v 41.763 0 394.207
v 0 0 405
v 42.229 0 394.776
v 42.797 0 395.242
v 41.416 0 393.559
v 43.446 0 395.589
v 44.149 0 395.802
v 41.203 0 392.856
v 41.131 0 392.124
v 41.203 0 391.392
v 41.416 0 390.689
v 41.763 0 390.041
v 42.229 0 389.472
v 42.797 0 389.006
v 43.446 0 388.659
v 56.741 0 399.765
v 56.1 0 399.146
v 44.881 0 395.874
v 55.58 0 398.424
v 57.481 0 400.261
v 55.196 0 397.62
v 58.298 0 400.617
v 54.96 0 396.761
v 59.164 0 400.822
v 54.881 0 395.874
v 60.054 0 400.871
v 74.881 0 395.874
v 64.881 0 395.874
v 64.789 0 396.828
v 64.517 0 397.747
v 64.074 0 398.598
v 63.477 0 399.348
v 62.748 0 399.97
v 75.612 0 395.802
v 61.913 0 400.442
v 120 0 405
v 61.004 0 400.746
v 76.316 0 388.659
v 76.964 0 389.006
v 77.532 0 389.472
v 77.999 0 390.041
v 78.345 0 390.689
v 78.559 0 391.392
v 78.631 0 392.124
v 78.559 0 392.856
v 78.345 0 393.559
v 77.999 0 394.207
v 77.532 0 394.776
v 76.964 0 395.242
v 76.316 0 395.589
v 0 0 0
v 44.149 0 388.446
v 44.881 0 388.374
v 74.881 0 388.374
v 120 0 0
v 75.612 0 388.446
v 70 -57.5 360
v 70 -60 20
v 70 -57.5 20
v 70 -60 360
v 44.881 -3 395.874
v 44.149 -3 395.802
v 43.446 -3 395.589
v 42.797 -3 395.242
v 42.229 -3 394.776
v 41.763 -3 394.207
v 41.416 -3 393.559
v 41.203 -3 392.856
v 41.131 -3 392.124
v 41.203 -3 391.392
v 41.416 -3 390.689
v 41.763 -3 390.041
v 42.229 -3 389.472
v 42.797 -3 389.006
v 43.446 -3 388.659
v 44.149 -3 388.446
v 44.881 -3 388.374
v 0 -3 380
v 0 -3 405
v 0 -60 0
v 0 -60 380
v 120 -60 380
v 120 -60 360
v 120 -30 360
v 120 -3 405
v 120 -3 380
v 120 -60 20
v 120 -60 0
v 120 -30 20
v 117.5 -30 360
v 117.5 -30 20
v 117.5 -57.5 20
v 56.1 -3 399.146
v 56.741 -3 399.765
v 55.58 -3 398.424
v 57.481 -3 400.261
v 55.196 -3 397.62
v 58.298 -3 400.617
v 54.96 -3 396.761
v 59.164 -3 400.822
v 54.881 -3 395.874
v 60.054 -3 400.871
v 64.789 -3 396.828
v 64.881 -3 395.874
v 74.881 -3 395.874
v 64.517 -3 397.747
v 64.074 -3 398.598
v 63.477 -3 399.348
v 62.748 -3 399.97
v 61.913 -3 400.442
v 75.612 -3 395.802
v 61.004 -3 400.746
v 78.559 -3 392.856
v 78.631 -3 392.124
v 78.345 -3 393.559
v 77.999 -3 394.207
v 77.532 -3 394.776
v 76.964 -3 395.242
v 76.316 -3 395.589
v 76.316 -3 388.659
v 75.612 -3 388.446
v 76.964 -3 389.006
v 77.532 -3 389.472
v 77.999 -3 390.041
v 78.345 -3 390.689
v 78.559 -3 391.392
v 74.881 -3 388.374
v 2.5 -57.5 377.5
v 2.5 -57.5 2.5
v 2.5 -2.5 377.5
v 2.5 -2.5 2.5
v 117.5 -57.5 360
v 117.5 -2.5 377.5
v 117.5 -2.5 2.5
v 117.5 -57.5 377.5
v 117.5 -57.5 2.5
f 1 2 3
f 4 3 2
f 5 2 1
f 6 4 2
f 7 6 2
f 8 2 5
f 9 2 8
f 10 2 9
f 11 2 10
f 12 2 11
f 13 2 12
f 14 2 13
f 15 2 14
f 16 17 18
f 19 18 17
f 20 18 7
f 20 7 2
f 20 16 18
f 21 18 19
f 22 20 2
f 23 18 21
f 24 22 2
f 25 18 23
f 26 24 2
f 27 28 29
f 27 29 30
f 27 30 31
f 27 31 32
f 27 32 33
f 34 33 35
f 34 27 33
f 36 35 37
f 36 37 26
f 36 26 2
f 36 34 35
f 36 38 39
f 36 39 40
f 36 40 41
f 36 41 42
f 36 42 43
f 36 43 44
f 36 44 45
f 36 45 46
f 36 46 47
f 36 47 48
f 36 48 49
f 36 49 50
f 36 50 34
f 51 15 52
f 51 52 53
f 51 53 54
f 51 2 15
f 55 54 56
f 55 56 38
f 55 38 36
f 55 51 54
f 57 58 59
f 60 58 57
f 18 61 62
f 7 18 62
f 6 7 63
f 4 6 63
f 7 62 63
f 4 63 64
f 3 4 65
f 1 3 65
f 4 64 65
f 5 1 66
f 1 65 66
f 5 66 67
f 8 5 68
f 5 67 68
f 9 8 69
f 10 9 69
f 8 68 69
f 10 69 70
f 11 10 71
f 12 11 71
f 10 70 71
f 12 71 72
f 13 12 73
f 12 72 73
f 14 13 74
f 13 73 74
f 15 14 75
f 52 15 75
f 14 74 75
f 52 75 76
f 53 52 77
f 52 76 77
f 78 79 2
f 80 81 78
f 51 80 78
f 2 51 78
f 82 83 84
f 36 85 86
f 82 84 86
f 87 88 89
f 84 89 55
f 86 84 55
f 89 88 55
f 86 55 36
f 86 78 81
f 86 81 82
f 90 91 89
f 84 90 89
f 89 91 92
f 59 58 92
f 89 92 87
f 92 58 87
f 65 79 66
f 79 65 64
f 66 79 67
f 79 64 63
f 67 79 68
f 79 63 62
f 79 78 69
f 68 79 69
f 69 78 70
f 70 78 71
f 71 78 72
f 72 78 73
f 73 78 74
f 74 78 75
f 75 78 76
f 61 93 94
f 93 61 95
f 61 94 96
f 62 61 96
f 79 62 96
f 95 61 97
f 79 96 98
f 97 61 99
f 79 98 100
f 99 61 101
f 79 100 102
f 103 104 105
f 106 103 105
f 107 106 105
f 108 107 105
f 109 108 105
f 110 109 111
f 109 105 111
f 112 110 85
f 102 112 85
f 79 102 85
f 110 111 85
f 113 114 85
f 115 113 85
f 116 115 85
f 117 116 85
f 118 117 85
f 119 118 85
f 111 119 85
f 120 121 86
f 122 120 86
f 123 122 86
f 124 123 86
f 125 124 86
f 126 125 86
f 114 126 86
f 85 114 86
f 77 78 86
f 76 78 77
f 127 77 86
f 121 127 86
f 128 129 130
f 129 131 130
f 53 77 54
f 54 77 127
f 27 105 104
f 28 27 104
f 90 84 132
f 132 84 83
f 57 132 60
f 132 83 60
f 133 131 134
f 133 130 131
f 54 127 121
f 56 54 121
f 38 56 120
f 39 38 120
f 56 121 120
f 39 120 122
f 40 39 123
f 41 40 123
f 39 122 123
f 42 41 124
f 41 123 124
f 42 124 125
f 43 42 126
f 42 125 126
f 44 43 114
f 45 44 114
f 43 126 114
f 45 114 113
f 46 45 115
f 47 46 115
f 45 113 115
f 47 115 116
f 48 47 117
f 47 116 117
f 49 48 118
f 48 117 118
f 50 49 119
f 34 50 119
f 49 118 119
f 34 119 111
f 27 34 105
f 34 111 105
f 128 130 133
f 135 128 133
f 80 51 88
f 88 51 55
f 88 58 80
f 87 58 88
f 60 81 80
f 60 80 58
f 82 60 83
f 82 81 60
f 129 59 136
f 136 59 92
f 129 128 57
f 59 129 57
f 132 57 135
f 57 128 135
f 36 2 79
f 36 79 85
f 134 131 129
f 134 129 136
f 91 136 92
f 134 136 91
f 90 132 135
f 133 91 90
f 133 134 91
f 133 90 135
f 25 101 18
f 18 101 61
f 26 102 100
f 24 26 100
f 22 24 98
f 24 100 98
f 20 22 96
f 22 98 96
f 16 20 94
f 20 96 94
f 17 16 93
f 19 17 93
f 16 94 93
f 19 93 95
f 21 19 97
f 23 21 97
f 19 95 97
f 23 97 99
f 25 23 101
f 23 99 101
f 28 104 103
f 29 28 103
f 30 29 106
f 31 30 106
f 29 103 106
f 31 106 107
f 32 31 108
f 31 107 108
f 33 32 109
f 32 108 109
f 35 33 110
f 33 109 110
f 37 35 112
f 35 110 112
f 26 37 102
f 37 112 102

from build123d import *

# Parameters (mm, degrees)
F0_W     = 120
F0_H     = 380
F1_DEPTH = 60
F2_W     = 50
F2_H     = 340
F3_DEPTH = 30
F4_T     = -2.5
F5_W     = 120
F5_H     = 3
F6_DEPTH = 25
F8_DEPTH = 25


with BuildPart() as f1:
    # F0 (on Front) → F1 (new body)
    with BuildSketch(Plane.XZ):
        with Locations((60, 190)):
            Rectangle(F0_W, F0_H)
    extrude(amount=F1_DEPTH)

    # F2 (on face) → F3 (cut)
    with BuildSketch(Plane.XZ.offset(60)):
        with Locations((145, 190)):
            Rectangle(F2_W, F2_H)
        with Locations((95, 190)):
            Rectangle(F2_W, F2_H)
    extrude(amount=-F3_DEPTH, mode=Mode.SUBTRACT)

    # F4
    f4_openings = [f1.faces().sort_by_distance(p)[0] for p in [
        (95, -45, 20),
        (95, -30, 190),
        (70, -45, 190),
        (95, -45, 360),
    ]]
    offset(amount=F4_T, openings=f4_openings)

    # F5 (on face) → F6 (join)
    with BuildSketch(Plane.XY.offset(380)):
        with Locations((60, -1.5)):
            Rectangle(F5_W, F5_H)
    extrude(amount=F6_DEPTH)

    # F7 (on face) → F8 (cut)
    with BuildSketch(Plane.XZ.offset(3)):
        with BuildLine():
            ThreePointArc((64.880804, 395.873971), (63.476993, 399.347791), (60.053833, 400.870976))
            ThreePointArc((60.053833, 400.870976), (56.406984, 399.47016), (54.880804, 395.873971))
            Line((54.880804, 395.873971), (44.880804, 395.873971))
            ThreePointArc((44.880804, 395.873971), (41.130804, 392.123971), (44.880804, 388.373971))
            Line((44.880804, 388.373971), (74.880804, 388.373971))
            ThreePointArc((74.880804, 388.373971), (78.630804, 392.123971), (74.880804, 395.873971))
            Line((74.880804, 395.873971), (64.880804, 395.873971))
        make_face()
    extrude(amount=-F8_DEPTH, mode=Mode.SUBTRACT)


solid = f1.part
